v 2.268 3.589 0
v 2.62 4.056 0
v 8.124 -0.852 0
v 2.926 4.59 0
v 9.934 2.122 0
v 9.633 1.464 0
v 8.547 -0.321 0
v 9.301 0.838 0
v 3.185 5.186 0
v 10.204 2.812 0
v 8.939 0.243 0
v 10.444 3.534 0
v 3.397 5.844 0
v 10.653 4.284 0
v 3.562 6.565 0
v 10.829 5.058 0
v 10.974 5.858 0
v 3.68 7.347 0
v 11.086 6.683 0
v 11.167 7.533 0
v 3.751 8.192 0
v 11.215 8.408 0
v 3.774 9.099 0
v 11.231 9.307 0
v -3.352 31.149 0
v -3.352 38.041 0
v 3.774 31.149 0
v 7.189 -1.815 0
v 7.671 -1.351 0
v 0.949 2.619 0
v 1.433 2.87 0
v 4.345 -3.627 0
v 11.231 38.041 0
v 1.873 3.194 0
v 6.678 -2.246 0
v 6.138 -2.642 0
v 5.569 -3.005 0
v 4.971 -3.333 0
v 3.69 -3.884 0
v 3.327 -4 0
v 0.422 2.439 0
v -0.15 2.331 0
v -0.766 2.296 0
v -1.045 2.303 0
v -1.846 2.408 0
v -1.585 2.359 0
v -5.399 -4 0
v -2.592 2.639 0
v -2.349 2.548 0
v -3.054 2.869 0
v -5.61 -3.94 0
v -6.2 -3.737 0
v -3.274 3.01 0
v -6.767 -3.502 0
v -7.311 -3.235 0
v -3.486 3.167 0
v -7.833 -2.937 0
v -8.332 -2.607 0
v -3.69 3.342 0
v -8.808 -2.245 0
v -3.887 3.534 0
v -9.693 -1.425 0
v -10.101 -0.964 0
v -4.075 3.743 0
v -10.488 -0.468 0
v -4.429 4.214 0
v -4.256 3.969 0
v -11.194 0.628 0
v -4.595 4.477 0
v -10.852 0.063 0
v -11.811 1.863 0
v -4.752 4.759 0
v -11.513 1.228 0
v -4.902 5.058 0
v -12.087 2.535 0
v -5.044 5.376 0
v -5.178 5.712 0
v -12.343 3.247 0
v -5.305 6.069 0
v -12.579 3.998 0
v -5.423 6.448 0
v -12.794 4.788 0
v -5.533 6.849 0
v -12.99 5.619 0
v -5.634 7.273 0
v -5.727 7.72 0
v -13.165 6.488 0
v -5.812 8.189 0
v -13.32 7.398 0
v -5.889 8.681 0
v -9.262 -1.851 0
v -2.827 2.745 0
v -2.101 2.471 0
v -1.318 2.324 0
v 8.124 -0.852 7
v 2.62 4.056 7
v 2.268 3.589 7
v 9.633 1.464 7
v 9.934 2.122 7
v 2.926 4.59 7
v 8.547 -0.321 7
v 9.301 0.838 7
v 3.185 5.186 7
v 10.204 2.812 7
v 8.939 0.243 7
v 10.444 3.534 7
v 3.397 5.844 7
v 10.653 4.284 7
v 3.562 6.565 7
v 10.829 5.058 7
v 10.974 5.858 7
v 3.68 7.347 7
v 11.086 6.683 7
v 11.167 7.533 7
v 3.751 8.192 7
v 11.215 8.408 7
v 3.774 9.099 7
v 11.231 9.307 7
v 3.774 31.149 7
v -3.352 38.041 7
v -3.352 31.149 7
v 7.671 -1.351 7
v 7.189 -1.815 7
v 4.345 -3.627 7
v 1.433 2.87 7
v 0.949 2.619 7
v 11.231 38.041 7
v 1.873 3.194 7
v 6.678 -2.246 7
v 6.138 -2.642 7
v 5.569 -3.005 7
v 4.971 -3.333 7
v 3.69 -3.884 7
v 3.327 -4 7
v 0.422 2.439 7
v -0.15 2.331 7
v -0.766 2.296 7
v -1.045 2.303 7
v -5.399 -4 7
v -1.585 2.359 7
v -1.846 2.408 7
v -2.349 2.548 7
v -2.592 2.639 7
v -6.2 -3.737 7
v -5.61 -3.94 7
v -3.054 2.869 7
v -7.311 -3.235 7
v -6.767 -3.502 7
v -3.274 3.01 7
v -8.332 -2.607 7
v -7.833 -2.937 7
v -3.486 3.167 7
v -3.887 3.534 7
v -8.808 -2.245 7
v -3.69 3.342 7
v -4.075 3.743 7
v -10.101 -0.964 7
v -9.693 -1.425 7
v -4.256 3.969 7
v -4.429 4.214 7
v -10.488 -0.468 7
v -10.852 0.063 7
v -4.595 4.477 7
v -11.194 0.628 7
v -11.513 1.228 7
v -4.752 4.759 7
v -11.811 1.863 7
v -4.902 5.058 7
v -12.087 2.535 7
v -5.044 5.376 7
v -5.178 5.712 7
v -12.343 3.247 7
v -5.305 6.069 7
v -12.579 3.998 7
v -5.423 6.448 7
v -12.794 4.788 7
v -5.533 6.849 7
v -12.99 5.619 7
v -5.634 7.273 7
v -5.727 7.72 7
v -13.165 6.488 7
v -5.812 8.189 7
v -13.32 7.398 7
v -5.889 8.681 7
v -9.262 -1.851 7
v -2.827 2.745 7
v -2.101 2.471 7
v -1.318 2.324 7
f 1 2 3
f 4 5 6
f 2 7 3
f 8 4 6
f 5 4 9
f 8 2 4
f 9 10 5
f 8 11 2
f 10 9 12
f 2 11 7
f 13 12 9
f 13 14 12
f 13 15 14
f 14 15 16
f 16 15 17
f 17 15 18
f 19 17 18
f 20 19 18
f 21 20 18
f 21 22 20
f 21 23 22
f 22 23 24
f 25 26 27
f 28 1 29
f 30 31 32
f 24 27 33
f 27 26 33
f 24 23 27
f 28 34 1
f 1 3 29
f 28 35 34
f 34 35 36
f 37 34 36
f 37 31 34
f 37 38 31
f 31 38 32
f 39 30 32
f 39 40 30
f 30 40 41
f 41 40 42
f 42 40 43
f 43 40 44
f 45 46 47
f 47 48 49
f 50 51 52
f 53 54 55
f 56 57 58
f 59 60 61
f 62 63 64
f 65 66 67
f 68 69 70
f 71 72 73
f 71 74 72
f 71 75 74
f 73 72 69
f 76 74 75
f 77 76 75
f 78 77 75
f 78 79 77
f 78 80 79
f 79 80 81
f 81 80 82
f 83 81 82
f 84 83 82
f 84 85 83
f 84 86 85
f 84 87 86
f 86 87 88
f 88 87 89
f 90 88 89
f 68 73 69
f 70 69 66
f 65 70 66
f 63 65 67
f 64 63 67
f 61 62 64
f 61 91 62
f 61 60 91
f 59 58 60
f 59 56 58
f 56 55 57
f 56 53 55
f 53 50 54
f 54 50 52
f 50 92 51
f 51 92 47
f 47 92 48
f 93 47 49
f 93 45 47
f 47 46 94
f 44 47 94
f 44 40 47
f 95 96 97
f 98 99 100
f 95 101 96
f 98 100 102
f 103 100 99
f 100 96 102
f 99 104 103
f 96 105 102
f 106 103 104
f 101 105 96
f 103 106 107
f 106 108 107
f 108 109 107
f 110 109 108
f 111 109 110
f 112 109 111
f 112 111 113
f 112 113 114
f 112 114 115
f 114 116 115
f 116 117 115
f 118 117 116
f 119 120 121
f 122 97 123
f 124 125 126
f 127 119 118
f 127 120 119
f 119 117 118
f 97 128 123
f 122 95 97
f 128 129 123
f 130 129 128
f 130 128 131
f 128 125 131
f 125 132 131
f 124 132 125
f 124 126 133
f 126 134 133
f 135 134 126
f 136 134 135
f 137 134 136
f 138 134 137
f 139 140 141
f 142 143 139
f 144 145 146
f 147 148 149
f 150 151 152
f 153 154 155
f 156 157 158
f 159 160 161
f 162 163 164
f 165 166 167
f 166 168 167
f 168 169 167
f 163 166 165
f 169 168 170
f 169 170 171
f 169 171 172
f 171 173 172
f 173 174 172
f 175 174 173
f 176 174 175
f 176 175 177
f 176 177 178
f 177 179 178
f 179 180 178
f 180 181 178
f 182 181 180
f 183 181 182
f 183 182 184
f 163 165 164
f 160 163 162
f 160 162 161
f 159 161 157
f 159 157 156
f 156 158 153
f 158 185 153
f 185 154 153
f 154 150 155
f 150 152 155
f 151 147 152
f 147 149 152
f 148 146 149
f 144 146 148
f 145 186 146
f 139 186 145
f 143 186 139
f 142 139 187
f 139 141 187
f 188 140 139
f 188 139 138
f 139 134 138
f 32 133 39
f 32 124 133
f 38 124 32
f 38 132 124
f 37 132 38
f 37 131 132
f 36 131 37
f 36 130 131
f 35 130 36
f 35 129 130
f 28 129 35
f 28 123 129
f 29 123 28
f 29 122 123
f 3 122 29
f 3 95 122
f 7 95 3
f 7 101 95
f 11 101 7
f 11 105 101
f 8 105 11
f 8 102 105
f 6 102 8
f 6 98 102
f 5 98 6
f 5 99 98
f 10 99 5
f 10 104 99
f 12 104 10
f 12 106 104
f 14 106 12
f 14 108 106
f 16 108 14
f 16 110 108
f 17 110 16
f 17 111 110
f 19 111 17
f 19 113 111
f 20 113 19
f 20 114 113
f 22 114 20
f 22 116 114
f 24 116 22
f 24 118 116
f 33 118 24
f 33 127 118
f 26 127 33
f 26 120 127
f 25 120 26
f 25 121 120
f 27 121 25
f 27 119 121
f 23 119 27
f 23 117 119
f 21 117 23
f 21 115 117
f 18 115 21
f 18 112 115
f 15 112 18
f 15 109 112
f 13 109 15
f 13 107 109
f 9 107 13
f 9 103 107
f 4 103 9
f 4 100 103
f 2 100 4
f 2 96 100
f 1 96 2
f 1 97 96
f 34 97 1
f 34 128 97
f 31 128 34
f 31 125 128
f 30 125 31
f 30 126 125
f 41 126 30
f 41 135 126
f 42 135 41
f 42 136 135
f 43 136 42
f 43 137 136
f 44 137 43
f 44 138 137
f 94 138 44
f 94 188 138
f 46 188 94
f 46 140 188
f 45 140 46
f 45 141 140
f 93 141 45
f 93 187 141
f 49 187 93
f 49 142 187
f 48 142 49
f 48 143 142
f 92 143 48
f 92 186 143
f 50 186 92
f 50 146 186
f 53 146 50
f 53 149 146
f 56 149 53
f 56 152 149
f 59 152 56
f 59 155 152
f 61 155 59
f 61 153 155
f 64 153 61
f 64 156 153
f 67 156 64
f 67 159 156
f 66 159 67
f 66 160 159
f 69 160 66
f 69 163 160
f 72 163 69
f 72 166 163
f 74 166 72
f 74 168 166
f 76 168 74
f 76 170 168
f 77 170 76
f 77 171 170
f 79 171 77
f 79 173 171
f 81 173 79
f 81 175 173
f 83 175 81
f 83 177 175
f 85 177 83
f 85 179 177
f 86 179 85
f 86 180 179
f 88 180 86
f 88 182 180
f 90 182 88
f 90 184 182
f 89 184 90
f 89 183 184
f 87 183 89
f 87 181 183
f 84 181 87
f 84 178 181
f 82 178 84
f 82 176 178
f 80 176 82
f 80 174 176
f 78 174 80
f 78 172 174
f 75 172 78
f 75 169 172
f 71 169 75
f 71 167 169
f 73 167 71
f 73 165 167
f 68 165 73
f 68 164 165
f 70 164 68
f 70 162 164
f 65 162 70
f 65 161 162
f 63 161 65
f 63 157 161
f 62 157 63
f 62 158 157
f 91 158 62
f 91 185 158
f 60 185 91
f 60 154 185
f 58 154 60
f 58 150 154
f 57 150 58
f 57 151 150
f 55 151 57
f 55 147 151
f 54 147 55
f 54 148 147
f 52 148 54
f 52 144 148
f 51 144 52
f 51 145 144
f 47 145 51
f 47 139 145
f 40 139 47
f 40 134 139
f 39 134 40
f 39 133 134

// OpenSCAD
// file: glyph.scad
// glyph — the shared geometry of every letter in the set. Defines named geometry
// only, so it renders nothing on its own; each letter part includes it and calls
// letter(). Every dimension lives in ../../lib/common.scad.
//
// A LETTER IS NOTHING BUT A LETTER. No plinth, no tongue, no tab — it is the
// bare glyph, and it attaches by standing in the deck groove and resting on the
// groove's floor. Anything else on it would be a distraction on a learning toy.
//
// It is a flat plate of one thickness, printed face-down: no overhang anywhere,
// no supports, and the face on the bed comes out smoothest.
//
// TWO TRAPS WITH text():
//
//  * A missing font FALLS BACK SILENTLY — no warning, no error, just different
//    letters. "Liberation Sans" was the first choice here because OpenSCAD
//    bundles it; on macOS the bundled faces are not registered with fontconfig,
//    so it rendered the fallback face instead and nothing said so. To check a
//    font resolved, render a string with it and with a deliberately bogus name
//    and compare bounding boxes: identical means it fell back.
//  * `size` is not the cap height in general. For Helvetica Bold they coincide
//    (size 44 -> 44.0 mm cap), which is why letter_size reads as a height.
//    Change the font and re-measure.

include <../../lib/common.scad>

// The letter's outline, upright in the XY plane, ready to be extruded along Z
// (which is the letter's thickness, and the print's build axis).
//
//   y = 0   is the deck surface
//   y < 0   is the part standing down inside the groove. It reaches letter_bury,
//           which is where the tapered groove closes to letter_t — NOT the
//           groove's floor. The letter wedges; it never bottoms out.
module glyph_2d(ch) {
    intersection() {
        translate([0, -letter_bury])
            scale([letter_condense, 1])
                text(ch, size = letter_size, font = letter_font,
                     halign = "center", valign = "baseline");
        // Trimmed flat at the baseline. Round letters (O, C, G, S) overshoot the
        // baseline by design, and a letter standing on a convex curve rocks —
        // there is nothing to stop it leaning. The trim costs nothing visible
        // and gives every letter a flat foot on the groove floor.
        translate([-200, -letter_bury]) square([400, 400]);
    }
}

// One letter, in its print orientation: lying on its face, thickness up Z.
module letter(ch) {
    linear_extrude(letter_t) glyph_2d(ch);
}

// Where that letter sits once it is dropped into a chassis, for fit checks.
module letter_fitted(ch) {
    translate([0, letter_t/2, body_top]) rotate([90, 0, 0]) letter(ch);
}
// main file
// letter J — one part. See glyph.scad for the geometry and lib/common.scad for
// the dimensions. Prints lying on its face, exactly as exported: no supports.

include <glyph.scad>

letter("J");
